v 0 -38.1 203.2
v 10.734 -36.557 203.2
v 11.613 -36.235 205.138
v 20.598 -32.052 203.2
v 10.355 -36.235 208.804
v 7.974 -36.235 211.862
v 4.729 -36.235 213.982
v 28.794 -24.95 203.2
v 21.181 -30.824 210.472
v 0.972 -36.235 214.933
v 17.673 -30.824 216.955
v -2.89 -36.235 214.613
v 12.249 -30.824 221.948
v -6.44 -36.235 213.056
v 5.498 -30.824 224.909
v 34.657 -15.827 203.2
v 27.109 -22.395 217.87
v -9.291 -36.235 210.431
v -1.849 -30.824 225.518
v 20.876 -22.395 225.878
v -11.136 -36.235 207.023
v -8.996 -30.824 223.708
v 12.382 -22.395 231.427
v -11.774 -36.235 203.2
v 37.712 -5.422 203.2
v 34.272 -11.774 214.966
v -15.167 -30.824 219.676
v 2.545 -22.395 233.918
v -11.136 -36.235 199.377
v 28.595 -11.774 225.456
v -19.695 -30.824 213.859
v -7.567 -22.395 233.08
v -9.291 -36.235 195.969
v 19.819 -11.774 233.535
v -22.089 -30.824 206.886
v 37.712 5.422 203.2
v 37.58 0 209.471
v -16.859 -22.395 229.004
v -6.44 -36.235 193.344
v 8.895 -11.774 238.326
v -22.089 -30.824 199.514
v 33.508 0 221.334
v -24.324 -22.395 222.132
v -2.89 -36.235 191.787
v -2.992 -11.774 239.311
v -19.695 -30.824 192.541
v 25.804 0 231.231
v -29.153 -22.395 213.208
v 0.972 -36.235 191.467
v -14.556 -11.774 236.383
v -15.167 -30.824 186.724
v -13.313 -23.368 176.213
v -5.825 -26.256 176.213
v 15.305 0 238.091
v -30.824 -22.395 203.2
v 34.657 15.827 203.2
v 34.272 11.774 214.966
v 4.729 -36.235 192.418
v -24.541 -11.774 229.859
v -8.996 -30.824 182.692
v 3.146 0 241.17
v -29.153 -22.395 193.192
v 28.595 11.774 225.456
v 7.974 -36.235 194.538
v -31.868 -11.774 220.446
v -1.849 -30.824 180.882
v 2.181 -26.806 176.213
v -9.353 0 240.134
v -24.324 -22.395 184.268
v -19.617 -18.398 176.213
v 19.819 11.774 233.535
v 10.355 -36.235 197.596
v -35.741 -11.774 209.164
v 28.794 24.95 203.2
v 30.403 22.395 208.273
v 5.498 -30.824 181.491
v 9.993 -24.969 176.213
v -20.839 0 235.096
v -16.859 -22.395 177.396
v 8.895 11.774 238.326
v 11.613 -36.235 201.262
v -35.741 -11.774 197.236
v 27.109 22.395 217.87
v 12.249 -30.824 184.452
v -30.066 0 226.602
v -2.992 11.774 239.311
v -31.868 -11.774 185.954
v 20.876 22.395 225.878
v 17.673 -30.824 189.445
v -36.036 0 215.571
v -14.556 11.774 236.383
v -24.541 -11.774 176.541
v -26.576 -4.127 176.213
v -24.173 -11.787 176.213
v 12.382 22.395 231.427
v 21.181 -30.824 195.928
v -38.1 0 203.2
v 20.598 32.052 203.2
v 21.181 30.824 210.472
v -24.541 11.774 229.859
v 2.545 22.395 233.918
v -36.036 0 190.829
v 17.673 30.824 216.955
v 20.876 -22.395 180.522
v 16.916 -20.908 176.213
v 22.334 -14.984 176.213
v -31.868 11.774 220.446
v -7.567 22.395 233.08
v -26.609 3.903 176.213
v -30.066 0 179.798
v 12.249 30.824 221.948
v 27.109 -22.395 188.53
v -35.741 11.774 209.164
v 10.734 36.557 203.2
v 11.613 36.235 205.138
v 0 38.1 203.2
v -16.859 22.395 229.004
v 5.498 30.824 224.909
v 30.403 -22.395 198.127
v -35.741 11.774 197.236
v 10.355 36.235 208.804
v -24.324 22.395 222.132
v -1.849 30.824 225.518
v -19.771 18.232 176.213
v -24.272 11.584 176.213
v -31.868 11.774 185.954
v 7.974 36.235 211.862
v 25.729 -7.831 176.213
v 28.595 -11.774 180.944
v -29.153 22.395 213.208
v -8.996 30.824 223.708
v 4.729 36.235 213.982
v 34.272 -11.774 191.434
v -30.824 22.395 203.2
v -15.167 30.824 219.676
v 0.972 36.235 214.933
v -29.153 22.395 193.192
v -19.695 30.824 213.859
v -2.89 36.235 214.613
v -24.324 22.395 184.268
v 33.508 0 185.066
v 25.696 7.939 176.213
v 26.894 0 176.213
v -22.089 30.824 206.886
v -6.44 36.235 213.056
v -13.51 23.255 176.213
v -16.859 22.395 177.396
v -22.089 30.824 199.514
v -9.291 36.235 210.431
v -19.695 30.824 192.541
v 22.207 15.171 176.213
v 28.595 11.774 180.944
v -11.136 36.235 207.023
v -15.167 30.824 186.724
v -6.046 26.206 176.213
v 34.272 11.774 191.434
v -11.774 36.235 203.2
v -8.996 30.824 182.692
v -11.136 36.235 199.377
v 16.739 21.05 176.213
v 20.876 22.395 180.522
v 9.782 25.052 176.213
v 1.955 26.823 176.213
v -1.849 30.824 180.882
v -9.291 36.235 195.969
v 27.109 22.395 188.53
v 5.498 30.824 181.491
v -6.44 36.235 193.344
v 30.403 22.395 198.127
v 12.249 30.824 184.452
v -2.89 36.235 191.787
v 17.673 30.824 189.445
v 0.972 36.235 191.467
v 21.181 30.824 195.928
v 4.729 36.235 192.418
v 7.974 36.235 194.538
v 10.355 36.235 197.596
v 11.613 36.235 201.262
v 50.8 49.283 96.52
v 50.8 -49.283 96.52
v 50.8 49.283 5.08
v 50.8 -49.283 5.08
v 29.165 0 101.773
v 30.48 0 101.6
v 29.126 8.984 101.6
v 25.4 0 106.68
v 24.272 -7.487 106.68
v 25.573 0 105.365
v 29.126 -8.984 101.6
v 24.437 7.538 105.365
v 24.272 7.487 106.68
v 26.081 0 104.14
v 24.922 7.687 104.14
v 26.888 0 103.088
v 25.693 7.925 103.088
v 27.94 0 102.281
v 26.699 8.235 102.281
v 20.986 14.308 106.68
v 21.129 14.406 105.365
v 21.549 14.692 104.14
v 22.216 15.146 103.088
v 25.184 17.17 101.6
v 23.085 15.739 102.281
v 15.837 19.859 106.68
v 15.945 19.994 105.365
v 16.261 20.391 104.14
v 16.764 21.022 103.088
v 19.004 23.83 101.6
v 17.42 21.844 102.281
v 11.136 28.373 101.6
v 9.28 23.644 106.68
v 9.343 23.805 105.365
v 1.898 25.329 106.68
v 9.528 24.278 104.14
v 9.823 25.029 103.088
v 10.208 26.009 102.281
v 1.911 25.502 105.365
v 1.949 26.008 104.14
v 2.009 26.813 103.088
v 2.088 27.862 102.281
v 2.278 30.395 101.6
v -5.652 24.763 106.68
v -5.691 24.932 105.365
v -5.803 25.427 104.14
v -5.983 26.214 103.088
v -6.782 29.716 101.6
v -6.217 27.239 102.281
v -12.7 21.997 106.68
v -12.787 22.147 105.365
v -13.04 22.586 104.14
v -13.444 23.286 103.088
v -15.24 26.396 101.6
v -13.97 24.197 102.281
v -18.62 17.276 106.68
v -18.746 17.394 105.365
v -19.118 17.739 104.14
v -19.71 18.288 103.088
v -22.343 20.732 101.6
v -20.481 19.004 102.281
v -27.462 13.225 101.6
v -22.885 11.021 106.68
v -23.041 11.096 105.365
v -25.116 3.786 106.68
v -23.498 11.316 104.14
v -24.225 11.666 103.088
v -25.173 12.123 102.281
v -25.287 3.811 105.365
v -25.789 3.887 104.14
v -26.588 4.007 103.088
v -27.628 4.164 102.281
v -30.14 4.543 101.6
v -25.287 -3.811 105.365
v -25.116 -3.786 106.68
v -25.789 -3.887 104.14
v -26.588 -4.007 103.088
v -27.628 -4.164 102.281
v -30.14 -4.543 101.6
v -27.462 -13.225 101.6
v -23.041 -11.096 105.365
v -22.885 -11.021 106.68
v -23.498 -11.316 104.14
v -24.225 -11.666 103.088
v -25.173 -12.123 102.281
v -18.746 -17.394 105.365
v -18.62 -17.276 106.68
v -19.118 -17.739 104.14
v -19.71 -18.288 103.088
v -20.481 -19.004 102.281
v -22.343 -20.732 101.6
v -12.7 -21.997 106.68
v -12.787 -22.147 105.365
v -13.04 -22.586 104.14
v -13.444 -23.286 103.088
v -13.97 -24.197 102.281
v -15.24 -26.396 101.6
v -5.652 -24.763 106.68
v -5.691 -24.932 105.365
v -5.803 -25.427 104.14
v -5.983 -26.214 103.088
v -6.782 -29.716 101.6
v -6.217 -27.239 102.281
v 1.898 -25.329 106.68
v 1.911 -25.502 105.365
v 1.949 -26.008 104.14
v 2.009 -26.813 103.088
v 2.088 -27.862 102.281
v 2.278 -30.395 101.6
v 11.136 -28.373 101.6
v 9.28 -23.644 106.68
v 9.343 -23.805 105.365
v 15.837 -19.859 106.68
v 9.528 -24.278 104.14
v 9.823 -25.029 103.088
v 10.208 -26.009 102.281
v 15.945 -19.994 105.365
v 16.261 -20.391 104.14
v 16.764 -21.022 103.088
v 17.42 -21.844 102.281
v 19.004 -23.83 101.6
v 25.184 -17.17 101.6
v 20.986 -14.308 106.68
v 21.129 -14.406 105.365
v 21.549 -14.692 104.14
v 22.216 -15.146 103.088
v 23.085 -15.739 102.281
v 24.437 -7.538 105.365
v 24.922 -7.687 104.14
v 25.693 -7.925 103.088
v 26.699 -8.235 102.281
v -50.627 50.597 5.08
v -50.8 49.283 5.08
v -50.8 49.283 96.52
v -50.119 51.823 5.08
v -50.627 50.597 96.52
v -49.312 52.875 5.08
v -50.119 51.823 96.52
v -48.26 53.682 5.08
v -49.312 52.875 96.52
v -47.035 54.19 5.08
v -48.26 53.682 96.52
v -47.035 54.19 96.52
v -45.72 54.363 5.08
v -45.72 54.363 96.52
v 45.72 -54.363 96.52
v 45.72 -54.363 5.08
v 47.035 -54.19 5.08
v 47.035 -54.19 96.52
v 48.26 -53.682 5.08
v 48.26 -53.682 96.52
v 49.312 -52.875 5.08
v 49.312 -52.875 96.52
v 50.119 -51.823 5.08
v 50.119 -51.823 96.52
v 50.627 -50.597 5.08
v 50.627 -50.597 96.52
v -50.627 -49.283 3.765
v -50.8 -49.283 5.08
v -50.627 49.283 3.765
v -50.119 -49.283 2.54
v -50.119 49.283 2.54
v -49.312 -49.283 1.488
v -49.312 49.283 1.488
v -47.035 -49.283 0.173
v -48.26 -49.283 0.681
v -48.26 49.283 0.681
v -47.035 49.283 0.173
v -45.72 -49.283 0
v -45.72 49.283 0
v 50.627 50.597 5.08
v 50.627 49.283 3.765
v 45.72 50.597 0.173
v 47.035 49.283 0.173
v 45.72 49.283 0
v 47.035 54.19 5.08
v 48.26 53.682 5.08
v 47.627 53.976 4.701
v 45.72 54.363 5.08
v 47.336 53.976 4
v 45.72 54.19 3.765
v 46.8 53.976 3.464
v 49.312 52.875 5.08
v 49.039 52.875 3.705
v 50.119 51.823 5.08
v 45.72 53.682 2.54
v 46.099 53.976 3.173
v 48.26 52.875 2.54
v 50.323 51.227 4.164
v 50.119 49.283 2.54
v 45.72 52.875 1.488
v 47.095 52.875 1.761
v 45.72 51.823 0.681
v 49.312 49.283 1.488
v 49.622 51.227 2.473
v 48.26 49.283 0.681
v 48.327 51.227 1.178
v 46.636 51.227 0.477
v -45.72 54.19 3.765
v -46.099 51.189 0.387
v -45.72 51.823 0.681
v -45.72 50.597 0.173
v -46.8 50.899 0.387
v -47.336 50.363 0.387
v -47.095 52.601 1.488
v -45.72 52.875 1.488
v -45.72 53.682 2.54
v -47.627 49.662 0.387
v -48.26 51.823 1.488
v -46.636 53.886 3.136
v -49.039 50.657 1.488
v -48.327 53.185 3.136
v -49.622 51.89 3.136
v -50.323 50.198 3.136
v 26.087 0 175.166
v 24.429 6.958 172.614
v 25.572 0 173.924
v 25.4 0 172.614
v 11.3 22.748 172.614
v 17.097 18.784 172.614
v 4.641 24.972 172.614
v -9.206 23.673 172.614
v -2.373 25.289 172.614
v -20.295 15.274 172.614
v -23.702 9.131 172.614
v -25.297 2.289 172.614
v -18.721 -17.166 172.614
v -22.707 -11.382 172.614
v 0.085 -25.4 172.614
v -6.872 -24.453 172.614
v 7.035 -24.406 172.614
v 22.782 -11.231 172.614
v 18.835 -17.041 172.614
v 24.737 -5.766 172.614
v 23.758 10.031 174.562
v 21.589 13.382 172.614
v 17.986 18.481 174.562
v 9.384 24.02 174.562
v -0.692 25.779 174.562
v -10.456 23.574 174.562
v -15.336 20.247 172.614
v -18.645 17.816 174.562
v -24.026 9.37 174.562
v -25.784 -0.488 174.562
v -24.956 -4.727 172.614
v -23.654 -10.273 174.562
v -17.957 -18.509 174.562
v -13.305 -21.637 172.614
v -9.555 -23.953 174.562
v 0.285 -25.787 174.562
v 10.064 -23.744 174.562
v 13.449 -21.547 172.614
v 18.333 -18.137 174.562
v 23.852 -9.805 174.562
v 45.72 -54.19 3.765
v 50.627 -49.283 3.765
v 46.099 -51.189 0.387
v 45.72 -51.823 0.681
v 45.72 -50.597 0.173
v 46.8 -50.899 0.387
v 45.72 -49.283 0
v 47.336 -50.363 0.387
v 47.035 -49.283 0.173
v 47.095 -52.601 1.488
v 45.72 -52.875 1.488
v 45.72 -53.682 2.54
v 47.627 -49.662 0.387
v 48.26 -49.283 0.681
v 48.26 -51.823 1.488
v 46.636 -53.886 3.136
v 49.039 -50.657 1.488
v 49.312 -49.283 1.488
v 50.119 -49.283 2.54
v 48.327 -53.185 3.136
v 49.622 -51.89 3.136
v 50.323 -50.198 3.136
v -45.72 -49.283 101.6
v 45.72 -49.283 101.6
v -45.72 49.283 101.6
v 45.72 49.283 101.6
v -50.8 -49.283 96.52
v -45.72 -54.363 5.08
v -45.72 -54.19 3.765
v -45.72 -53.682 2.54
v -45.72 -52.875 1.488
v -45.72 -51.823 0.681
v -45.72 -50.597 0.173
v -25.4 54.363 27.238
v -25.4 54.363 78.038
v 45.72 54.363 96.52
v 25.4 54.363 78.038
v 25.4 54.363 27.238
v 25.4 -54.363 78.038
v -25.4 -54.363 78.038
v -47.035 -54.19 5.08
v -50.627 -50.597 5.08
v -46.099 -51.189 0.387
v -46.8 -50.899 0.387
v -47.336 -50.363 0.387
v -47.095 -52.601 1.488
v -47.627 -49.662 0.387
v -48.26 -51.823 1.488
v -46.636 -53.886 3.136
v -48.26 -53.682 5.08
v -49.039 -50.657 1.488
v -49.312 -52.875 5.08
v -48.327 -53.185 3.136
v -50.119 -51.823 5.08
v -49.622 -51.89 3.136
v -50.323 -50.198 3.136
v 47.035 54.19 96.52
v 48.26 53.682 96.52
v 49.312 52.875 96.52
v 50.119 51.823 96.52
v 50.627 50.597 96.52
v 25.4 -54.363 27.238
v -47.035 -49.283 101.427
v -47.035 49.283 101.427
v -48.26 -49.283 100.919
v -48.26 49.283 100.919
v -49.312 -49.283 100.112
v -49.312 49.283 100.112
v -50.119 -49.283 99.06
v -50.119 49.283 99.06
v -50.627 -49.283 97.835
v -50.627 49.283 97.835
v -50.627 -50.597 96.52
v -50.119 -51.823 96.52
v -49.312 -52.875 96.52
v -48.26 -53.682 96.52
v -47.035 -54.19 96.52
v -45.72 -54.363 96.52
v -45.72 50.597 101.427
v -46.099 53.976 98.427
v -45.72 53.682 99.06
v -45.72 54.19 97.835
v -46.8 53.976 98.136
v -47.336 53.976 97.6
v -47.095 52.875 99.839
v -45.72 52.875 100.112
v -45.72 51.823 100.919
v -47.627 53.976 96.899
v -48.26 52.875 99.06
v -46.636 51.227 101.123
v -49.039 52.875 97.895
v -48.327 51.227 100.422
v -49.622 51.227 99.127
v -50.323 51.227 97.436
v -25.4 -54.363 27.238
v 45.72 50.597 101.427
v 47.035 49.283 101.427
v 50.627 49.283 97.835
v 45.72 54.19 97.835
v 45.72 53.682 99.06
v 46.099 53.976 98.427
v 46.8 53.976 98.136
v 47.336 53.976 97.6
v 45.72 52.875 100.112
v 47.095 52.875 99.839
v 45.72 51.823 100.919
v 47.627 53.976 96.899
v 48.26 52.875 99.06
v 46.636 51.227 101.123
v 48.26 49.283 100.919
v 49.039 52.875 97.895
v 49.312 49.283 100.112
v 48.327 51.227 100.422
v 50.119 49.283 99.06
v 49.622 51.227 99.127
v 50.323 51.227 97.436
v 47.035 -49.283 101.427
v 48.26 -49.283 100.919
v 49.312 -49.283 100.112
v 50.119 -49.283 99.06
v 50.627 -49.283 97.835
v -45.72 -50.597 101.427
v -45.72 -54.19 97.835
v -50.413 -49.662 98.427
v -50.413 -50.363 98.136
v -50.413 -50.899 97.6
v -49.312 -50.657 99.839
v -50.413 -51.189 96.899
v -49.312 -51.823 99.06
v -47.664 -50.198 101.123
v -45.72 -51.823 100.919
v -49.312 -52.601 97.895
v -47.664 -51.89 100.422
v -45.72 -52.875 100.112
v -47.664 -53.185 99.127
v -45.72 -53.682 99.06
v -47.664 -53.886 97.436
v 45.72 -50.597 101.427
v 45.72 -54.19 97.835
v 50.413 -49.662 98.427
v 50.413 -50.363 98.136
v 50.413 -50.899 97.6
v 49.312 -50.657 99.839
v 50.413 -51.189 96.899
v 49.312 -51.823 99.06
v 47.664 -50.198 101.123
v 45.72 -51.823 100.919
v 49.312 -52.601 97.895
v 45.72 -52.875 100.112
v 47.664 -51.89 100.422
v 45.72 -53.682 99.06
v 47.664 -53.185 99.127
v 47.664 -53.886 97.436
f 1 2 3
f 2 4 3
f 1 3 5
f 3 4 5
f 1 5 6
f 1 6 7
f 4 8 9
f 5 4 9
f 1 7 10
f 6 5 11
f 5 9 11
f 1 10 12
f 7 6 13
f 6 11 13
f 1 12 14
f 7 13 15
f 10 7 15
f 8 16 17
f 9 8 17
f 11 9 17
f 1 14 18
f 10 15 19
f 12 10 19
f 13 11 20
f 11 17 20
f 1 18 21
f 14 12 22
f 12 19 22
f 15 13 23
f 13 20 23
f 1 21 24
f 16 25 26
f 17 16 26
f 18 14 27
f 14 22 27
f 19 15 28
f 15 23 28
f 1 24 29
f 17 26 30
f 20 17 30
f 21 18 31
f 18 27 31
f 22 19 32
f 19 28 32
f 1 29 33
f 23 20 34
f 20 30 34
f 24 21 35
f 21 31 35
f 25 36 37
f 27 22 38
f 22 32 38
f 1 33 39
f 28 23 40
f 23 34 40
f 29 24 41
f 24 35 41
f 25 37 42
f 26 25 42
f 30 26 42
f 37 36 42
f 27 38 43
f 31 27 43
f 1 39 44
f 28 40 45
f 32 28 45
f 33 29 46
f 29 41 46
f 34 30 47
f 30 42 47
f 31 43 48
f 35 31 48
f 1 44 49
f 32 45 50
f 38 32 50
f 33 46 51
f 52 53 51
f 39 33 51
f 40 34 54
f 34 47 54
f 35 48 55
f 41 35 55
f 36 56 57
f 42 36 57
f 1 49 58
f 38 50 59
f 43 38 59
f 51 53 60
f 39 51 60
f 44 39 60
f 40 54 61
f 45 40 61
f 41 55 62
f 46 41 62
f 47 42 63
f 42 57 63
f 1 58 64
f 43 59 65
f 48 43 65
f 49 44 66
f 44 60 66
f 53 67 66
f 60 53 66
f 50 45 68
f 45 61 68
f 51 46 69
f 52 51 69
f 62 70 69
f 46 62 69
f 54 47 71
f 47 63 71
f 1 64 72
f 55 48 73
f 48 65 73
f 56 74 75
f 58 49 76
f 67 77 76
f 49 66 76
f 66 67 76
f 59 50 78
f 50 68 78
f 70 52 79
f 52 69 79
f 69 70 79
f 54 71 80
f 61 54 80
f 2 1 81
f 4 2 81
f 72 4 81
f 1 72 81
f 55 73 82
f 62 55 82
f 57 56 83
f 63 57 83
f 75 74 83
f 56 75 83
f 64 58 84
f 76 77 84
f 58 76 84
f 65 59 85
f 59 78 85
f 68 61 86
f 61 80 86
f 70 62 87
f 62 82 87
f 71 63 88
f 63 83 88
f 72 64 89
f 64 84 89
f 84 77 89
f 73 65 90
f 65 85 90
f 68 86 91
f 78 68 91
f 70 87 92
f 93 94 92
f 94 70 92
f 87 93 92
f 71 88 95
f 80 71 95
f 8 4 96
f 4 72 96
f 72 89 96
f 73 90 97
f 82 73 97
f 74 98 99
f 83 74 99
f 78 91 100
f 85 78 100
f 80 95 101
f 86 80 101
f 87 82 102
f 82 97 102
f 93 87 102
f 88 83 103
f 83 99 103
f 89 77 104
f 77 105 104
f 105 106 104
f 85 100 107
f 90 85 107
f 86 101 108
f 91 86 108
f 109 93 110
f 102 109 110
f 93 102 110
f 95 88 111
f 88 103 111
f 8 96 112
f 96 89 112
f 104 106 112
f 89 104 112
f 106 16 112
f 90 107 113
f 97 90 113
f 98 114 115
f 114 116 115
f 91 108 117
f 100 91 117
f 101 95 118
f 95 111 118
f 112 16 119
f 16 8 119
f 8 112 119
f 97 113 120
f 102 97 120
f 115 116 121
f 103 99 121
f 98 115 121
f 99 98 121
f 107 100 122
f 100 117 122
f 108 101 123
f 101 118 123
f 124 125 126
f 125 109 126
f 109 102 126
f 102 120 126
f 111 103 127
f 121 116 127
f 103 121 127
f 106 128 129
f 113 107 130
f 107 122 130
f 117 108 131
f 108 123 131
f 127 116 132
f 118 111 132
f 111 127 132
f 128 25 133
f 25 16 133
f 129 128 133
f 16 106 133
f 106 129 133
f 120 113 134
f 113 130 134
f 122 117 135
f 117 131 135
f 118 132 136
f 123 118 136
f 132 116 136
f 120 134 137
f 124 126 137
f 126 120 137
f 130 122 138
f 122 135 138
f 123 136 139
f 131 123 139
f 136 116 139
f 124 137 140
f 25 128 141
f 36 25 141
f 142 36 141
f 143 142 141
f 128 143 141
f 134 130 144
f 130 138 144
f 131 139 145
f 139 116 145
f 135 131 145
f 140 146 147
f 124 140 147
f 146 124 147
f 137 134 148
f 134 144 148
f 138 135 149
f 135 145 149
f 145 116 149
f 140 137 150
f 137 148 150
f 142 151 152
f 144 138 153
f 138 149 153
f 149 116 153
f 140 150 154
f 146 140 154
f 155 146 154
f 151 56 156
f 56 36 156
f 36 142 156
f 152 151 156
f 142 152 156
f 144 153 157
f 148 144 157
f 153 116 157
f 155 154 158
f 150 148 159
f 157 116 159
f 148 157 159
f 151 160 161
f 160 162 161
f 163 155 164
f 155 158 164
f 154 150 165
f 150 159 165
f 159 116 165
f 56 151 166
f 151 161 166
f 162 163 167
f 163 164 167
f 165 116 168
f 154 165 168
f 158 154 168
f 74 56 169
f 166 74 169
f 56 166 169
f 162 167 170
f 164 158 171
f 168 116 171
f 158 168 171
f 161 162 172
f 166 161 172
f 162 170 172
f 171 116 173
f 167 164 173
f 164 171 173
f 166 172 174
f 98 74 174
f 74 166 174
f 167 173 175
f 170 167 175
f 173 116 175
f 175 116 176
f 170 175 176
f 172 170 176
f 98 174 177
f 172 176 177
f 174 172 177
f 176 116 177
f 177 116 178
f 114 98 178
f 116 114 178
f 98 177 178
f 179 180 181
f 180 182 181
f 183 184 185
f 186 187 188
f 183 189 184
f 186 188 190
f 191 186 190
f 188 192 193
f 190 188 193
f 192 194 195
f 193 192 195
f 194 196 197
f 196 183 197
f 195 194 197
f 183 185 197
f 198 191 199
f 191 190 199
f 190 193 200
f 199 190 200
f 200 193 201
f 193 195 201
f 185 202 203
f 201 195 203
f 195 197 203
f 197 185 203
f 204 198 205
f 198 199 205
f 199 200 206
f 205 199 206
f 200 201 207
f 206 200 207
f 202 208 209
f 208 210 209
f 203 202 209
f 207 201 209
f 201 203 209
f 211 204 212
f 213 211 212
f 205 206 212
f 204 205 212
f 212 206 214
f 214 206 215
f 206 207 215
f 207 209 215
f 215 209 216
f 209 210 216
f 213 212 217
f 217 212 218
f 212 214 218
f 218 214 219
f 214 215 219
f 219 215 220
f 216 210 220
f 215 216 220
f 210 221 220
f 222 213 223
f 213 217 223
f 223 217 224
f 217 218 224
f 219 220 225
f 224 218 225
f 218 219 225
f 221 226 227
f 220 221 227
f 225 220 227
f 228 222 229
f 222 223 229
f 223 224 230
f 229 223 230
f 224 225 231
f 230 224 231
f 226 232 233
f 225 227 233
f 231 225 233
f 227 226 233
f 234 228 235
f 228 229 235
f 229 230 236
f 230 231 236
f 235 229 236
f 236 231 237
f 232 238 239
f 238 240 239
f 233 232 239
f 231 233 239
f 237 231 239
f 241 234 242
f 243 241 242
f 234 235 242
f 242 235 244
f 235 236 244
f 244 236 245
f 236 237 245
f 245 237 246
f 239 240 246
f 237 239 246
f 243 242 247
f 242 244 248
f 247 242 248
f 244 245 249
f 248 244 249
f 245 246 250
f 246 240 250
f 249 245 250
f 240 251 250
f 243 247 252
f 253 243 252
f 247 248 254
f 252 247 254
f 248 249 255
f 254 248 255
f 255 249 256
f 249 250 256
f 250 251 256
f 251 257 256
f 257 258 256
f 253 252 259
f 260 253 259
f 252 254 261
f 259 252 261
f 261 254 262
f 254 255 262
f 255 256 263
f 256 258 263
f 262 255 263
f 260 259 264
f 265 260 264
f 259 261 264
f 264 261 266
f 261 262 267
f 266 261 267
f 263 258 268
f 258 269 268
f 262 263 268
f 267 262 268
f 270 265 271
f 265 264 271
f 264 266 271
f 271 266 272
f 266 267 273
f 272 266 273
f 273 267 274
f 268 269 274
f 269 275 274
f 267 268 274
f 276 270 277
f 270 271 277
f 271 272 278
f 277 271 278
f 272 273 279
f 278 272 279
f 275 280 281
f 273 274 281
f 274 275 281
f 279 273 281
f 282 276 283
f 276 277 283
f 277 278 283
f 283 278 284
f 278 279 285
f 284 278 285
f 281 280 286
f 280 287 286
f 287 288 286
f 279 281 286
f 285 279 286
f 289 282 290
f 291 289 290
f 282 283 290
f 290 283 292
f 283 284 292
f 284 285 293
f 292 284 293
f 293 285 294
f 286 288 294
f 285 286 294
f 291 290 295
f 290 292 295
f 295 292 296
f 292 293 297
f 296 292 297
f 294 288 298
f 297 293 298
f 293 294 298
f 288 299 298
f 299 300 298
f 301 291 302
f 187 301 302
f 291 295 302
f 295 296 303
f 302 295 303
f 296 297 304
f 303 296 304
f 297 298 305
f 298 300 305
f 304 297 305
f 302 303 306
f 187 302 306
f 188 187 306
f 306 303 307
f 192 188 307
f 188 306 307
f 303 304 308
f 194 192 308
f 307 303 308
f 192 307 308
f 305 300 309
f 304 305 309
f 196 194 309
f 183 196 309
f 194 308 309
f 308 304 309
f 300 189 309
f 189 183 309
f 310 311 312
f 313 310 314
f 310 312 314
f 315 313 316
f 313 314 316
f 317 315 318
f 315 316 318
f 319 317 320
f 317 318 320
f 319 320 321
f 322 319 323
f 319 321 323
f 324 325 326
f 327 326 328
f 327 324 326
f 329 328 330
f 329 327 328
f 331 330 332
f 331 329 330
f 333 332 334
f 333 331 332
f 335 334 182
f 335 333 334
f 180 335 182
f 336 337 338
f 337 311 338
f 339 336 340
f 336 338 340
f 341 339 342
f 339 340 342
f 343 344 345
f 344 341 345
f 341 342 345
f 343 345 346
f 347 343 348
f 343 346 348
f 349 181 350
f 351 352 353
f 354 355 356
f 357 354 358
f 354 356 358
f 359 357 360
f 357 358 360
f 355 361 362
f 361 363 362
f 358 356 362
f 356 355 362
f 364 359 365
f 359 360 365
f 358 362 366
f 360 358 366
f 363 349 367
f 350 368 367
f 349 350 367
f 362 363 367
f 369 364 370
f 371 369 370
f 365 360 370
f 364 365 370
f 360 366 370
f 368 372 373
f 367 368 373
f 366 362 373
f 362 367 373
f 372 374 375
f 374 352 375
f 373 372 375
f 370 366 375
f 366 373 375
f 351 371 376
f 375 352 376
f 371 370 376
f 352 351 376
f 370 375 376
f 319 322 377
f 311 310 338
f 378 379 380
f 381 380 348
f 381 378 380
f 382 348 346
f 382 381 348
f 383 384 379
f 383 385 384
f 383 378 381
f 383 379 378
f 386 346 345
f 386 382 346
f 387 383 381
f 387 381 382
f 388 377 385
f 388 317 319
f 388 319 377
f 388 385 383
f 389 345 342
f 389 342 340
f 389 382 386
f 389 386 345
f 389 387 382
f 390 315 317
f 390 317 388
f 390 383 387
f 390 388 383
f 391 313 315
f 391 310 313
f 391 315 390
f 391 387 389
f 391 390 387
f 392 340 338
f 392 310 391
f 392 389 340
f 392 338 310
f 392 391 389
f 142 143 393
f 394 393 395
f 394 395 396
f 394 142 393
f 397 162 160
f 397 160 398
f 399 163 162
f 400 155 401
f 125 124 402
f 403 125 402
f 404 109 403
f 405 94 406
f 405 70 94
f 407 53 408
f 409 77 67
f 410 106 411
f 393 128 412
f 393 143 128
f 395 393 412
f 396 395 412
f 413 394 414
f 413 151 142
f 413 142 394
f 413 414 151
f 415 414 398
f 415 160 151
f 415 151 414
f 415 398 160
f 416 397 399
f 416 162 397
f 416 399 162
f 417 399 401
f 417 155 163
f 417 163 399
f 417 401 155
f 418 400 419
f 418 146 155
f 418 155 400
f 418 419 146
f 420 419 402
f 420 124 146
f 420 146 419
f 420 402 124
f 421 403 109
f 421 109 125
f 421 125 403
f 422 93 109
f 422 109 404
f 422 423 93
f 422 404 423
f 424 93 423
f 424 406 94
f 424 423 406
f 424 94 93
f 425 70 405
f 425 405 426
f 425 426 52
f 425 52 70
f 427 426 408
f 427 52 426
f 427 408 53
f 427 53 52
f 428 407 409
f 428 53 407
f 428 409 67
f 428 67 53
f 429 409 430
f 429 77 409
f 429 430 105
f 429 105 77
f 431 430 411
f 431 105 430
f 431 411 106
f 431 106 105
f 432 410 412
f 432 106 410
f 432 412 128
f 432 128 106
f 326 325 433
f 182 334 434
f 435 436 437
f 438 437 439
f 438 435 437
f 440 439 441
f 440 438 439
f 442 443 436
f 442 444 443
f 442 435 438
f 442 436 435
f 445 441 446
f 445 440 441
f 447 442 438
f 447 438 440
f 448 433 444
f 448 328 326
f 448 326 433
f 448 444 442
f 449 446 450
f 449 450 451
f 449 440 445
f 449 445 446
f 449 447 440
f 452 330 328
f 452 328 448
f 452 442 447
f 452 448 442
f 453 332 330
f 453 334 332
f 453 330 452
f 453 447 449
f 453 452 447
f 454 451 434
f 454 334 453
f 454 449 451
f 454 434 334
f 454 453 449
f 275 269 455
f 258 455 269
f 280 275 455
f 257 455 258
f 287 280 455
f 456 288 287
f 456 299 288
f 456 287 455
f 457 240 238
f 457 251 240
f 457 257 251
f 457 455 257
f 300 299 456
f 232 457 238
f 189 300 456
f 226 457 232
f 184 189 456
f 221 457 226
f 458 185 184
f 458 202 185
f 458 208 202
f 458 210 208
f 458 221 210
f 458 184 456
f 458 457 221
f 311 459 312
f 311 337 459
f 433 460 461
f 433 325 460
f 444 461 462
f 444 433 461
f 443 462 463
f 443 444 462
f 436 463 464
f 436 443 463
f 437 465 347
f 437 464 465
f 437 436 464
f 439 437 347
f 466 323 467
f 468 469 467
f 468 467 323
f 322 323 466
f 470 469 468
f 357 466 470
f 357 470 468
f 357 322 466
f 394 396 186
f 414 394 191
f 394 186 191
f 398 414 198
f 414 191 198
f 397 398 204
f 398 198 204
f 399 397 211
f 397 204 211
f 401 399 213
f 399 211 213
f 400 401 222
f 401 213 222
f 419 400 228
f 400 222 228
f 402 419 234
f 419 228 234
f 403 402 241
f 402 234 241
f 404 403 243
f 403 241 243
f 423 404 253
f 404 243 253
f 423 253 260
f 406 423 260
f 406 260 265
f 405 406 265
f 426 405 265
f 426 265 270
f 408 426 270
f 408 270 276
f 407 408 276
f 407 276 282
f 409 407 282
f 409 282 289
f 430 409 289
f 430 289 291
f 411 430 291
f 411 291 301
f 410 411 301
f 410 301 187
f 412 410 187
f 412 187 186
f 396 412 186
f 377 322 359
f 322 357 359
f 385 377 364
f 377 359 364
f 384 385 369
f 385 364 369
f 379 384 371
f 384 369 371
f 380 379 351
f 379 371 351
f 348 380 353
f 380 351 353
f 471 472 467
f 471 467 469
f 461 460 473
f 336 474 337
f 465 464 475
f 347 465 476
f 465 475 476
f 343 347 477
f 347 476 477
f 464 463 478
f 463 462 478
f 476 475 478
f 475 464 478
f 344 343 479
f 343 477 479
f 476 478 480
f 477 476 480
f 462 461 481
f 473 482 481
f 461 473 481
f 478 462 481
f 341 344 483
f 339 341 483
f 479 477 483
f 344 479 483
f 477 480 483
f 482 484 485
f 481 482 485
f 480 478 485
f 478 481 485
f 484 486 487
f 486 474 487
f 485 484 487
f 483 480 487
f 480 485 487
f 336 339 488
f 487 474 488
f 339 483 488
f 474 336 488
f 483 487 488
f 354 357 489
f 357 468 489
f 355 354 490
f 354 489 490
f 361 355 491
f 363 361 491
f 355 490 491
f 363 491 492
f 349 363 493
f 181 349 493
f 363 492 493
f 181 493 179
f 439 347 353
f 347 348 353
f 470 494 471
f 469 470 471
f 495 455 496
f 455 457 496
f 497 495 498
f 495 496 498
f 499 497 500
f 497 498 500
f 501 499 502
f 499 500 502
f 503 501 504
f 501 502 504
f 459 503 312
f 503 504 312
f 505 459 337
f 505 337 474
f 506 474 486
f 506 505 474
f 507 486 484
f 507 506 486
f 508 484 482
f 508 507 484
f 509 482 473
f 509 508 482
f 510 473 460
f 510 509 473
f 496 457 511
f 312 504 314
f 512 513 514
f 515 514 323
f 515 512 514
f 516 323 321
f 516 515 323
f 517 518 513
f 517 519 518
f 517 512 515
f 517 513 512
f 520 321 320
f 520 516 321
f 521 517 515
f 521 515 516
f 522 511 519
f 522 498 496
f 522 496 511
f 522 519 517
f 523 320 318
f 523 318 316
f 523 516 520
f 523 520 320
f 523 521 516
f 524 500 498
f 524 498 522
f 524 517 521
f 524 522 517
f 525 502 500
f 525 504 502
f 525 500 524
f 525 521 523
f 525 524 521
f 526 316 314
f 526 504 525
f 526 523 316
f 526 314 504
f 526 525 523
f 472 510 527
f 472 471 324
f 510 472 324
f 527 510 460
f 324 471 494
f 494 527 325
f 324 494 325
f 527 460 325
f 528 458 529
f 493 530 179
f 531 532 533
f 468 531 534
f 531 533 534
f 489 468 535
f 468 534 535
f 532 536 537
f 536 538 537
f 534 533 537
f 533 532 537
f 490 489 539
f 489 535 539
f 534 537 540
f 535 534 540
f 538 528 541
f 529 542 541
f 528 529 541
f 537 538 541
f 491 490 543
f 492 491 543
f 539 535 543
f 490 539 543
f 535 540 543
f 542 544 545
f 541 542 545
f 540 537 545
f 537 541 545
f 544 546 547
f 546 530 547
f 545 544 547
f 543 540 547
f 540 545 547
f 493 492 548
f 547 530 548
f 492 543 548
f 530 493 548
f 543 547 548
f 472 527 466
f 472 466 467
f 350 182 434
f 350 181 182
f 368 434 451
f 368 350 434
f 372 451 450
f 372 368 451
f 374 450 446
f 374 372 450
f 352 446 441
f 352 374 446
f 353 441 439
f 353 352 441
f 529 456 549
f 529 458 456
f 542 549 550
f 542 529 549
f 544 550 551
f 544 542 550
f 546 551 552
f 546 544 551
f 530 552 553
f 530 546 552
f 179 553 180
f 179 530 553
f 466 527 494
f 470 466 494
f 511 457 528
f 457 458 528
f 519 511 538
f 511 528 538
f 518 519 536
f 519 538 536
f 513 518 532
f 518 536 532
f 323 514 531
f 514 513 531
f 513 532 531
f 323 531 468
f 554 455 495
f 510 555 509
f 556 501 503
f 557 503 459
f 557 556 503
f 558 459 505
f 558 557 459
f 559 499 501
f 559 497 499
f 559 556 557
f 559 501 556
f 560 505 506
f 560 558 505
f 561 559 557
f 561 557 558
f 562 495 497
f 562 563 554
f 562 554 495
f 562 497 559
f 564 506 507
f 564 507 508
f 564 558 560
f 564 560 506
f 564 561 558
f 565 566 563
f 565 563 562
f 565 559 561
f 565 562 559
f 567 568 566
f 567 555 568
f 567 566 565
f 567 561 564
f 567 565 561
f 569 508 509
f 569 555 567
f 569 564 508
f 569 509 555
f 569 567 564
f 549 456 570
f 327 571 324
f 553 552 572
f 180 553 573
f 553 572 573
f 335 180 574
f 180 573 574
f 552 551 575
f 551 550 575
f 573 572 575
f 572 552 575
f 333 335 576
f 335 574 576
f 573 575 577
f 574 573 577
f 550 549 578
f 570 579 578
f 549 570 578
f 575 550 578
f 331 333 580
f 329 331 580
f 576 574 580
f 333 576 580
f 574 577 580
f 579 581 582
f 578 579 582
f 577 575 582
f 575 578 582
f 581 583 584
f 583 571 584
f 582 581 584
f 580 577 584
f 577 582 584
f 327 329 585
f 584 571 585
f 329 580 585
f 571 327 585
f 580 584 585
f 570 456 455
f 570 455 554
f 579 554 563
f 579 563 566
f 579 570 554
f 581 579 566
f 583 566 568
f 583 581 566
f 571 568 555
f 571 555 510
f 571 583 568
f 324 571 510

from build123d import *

# Parameters (mm, degrees)
F0_W     = 101.6
F0_H     = 108.7252423167
F1_DEPTH = 101.6
F2_R     = 25.4
F3_DEPTH = 101.6
F8_W     = 50.8
F8_H     = 50.8
F9_DEPTH = 127
F10_R    = 5.08


with BuildPart() as f1:
    # F0 (on Top) → F1 (new body)
    with BuildSketch(Plane.XY):
        Rectangle(F0_W, F0_H)
    extrude(amount=F1_DEPTH)

    # F2 (on face) → F3 (join)
    with BuildSketch(Plane.XY.offset(101.6)):
        Circle(F2_R)
    extrude(amount=F3_DEPTH)

    # F5 (on face) → F6 (revolve)
    with BuildSketch(Plane.XY.offset(203.2)):
        with BuildLine():
            Line((0, -25.4), (0, -38.1))
            ThreePointArc((0, -38.1), (38.1, 0), (0, 38.1))
            Line((0, 38.1), (0, 25.4))
            ThreePointArc((0, 25.4), (17.9605122421, 17.9605122421), (25.4, 0))
            ThreePointArc((25.4, 0), (17.9605122421, -17.9605122421), (0, -25.4))
        make_face()
        with BuildLine():
            Line((0, 25.4), (0, -25.4))
            ThreePointArc((0, -25.4), (17.9605122421, -17.9605122421), (25.4, 0))
            ThreePointArc((25.4, 0), (17.9605122421, 17.9605122421), (0, 25.4))
        make_face()
    revolve(axis=Axis((0, 0, 203.2), (0, -1, 0)))

    # F8 (on face) → F9 (cut)
    with BuildSketch(Plane.XZ.offset(54.3626211584)):
        with Locations((0, 52.638284862)):
            Rectangle(F8_W, F8_H)
    extrude(amount=-F9_DEPTH, mode=Mode.SUBTRACT)

    # F10
    f10_edges = [f1.edges().sort_by_distance(p)[0] for p in [
        (0, -54.362621, 101.6),
        (50.8, 0, 101.6),
        (50.8, -54.362621, 50.8),
        (-50.8, 0, 101.6),
        (0, 54.362621, 101.6),
        (-50.8, -54.362621, 50.8),
        (0, -54.362621, 0),
        (50.8, 0, 0),
        (50.8, 54.362621, 50.8),
        (-50.8, 54.362621, 50.8),
        (0, 54.362621, 0),
        (-50.8, 0, 0),
        (-25.4, 0, 101.6),
        (-25.4, 0, 174.801937),
    ]]
    fillet(f10_edges, radius=F10_R)


solid = f1.part
